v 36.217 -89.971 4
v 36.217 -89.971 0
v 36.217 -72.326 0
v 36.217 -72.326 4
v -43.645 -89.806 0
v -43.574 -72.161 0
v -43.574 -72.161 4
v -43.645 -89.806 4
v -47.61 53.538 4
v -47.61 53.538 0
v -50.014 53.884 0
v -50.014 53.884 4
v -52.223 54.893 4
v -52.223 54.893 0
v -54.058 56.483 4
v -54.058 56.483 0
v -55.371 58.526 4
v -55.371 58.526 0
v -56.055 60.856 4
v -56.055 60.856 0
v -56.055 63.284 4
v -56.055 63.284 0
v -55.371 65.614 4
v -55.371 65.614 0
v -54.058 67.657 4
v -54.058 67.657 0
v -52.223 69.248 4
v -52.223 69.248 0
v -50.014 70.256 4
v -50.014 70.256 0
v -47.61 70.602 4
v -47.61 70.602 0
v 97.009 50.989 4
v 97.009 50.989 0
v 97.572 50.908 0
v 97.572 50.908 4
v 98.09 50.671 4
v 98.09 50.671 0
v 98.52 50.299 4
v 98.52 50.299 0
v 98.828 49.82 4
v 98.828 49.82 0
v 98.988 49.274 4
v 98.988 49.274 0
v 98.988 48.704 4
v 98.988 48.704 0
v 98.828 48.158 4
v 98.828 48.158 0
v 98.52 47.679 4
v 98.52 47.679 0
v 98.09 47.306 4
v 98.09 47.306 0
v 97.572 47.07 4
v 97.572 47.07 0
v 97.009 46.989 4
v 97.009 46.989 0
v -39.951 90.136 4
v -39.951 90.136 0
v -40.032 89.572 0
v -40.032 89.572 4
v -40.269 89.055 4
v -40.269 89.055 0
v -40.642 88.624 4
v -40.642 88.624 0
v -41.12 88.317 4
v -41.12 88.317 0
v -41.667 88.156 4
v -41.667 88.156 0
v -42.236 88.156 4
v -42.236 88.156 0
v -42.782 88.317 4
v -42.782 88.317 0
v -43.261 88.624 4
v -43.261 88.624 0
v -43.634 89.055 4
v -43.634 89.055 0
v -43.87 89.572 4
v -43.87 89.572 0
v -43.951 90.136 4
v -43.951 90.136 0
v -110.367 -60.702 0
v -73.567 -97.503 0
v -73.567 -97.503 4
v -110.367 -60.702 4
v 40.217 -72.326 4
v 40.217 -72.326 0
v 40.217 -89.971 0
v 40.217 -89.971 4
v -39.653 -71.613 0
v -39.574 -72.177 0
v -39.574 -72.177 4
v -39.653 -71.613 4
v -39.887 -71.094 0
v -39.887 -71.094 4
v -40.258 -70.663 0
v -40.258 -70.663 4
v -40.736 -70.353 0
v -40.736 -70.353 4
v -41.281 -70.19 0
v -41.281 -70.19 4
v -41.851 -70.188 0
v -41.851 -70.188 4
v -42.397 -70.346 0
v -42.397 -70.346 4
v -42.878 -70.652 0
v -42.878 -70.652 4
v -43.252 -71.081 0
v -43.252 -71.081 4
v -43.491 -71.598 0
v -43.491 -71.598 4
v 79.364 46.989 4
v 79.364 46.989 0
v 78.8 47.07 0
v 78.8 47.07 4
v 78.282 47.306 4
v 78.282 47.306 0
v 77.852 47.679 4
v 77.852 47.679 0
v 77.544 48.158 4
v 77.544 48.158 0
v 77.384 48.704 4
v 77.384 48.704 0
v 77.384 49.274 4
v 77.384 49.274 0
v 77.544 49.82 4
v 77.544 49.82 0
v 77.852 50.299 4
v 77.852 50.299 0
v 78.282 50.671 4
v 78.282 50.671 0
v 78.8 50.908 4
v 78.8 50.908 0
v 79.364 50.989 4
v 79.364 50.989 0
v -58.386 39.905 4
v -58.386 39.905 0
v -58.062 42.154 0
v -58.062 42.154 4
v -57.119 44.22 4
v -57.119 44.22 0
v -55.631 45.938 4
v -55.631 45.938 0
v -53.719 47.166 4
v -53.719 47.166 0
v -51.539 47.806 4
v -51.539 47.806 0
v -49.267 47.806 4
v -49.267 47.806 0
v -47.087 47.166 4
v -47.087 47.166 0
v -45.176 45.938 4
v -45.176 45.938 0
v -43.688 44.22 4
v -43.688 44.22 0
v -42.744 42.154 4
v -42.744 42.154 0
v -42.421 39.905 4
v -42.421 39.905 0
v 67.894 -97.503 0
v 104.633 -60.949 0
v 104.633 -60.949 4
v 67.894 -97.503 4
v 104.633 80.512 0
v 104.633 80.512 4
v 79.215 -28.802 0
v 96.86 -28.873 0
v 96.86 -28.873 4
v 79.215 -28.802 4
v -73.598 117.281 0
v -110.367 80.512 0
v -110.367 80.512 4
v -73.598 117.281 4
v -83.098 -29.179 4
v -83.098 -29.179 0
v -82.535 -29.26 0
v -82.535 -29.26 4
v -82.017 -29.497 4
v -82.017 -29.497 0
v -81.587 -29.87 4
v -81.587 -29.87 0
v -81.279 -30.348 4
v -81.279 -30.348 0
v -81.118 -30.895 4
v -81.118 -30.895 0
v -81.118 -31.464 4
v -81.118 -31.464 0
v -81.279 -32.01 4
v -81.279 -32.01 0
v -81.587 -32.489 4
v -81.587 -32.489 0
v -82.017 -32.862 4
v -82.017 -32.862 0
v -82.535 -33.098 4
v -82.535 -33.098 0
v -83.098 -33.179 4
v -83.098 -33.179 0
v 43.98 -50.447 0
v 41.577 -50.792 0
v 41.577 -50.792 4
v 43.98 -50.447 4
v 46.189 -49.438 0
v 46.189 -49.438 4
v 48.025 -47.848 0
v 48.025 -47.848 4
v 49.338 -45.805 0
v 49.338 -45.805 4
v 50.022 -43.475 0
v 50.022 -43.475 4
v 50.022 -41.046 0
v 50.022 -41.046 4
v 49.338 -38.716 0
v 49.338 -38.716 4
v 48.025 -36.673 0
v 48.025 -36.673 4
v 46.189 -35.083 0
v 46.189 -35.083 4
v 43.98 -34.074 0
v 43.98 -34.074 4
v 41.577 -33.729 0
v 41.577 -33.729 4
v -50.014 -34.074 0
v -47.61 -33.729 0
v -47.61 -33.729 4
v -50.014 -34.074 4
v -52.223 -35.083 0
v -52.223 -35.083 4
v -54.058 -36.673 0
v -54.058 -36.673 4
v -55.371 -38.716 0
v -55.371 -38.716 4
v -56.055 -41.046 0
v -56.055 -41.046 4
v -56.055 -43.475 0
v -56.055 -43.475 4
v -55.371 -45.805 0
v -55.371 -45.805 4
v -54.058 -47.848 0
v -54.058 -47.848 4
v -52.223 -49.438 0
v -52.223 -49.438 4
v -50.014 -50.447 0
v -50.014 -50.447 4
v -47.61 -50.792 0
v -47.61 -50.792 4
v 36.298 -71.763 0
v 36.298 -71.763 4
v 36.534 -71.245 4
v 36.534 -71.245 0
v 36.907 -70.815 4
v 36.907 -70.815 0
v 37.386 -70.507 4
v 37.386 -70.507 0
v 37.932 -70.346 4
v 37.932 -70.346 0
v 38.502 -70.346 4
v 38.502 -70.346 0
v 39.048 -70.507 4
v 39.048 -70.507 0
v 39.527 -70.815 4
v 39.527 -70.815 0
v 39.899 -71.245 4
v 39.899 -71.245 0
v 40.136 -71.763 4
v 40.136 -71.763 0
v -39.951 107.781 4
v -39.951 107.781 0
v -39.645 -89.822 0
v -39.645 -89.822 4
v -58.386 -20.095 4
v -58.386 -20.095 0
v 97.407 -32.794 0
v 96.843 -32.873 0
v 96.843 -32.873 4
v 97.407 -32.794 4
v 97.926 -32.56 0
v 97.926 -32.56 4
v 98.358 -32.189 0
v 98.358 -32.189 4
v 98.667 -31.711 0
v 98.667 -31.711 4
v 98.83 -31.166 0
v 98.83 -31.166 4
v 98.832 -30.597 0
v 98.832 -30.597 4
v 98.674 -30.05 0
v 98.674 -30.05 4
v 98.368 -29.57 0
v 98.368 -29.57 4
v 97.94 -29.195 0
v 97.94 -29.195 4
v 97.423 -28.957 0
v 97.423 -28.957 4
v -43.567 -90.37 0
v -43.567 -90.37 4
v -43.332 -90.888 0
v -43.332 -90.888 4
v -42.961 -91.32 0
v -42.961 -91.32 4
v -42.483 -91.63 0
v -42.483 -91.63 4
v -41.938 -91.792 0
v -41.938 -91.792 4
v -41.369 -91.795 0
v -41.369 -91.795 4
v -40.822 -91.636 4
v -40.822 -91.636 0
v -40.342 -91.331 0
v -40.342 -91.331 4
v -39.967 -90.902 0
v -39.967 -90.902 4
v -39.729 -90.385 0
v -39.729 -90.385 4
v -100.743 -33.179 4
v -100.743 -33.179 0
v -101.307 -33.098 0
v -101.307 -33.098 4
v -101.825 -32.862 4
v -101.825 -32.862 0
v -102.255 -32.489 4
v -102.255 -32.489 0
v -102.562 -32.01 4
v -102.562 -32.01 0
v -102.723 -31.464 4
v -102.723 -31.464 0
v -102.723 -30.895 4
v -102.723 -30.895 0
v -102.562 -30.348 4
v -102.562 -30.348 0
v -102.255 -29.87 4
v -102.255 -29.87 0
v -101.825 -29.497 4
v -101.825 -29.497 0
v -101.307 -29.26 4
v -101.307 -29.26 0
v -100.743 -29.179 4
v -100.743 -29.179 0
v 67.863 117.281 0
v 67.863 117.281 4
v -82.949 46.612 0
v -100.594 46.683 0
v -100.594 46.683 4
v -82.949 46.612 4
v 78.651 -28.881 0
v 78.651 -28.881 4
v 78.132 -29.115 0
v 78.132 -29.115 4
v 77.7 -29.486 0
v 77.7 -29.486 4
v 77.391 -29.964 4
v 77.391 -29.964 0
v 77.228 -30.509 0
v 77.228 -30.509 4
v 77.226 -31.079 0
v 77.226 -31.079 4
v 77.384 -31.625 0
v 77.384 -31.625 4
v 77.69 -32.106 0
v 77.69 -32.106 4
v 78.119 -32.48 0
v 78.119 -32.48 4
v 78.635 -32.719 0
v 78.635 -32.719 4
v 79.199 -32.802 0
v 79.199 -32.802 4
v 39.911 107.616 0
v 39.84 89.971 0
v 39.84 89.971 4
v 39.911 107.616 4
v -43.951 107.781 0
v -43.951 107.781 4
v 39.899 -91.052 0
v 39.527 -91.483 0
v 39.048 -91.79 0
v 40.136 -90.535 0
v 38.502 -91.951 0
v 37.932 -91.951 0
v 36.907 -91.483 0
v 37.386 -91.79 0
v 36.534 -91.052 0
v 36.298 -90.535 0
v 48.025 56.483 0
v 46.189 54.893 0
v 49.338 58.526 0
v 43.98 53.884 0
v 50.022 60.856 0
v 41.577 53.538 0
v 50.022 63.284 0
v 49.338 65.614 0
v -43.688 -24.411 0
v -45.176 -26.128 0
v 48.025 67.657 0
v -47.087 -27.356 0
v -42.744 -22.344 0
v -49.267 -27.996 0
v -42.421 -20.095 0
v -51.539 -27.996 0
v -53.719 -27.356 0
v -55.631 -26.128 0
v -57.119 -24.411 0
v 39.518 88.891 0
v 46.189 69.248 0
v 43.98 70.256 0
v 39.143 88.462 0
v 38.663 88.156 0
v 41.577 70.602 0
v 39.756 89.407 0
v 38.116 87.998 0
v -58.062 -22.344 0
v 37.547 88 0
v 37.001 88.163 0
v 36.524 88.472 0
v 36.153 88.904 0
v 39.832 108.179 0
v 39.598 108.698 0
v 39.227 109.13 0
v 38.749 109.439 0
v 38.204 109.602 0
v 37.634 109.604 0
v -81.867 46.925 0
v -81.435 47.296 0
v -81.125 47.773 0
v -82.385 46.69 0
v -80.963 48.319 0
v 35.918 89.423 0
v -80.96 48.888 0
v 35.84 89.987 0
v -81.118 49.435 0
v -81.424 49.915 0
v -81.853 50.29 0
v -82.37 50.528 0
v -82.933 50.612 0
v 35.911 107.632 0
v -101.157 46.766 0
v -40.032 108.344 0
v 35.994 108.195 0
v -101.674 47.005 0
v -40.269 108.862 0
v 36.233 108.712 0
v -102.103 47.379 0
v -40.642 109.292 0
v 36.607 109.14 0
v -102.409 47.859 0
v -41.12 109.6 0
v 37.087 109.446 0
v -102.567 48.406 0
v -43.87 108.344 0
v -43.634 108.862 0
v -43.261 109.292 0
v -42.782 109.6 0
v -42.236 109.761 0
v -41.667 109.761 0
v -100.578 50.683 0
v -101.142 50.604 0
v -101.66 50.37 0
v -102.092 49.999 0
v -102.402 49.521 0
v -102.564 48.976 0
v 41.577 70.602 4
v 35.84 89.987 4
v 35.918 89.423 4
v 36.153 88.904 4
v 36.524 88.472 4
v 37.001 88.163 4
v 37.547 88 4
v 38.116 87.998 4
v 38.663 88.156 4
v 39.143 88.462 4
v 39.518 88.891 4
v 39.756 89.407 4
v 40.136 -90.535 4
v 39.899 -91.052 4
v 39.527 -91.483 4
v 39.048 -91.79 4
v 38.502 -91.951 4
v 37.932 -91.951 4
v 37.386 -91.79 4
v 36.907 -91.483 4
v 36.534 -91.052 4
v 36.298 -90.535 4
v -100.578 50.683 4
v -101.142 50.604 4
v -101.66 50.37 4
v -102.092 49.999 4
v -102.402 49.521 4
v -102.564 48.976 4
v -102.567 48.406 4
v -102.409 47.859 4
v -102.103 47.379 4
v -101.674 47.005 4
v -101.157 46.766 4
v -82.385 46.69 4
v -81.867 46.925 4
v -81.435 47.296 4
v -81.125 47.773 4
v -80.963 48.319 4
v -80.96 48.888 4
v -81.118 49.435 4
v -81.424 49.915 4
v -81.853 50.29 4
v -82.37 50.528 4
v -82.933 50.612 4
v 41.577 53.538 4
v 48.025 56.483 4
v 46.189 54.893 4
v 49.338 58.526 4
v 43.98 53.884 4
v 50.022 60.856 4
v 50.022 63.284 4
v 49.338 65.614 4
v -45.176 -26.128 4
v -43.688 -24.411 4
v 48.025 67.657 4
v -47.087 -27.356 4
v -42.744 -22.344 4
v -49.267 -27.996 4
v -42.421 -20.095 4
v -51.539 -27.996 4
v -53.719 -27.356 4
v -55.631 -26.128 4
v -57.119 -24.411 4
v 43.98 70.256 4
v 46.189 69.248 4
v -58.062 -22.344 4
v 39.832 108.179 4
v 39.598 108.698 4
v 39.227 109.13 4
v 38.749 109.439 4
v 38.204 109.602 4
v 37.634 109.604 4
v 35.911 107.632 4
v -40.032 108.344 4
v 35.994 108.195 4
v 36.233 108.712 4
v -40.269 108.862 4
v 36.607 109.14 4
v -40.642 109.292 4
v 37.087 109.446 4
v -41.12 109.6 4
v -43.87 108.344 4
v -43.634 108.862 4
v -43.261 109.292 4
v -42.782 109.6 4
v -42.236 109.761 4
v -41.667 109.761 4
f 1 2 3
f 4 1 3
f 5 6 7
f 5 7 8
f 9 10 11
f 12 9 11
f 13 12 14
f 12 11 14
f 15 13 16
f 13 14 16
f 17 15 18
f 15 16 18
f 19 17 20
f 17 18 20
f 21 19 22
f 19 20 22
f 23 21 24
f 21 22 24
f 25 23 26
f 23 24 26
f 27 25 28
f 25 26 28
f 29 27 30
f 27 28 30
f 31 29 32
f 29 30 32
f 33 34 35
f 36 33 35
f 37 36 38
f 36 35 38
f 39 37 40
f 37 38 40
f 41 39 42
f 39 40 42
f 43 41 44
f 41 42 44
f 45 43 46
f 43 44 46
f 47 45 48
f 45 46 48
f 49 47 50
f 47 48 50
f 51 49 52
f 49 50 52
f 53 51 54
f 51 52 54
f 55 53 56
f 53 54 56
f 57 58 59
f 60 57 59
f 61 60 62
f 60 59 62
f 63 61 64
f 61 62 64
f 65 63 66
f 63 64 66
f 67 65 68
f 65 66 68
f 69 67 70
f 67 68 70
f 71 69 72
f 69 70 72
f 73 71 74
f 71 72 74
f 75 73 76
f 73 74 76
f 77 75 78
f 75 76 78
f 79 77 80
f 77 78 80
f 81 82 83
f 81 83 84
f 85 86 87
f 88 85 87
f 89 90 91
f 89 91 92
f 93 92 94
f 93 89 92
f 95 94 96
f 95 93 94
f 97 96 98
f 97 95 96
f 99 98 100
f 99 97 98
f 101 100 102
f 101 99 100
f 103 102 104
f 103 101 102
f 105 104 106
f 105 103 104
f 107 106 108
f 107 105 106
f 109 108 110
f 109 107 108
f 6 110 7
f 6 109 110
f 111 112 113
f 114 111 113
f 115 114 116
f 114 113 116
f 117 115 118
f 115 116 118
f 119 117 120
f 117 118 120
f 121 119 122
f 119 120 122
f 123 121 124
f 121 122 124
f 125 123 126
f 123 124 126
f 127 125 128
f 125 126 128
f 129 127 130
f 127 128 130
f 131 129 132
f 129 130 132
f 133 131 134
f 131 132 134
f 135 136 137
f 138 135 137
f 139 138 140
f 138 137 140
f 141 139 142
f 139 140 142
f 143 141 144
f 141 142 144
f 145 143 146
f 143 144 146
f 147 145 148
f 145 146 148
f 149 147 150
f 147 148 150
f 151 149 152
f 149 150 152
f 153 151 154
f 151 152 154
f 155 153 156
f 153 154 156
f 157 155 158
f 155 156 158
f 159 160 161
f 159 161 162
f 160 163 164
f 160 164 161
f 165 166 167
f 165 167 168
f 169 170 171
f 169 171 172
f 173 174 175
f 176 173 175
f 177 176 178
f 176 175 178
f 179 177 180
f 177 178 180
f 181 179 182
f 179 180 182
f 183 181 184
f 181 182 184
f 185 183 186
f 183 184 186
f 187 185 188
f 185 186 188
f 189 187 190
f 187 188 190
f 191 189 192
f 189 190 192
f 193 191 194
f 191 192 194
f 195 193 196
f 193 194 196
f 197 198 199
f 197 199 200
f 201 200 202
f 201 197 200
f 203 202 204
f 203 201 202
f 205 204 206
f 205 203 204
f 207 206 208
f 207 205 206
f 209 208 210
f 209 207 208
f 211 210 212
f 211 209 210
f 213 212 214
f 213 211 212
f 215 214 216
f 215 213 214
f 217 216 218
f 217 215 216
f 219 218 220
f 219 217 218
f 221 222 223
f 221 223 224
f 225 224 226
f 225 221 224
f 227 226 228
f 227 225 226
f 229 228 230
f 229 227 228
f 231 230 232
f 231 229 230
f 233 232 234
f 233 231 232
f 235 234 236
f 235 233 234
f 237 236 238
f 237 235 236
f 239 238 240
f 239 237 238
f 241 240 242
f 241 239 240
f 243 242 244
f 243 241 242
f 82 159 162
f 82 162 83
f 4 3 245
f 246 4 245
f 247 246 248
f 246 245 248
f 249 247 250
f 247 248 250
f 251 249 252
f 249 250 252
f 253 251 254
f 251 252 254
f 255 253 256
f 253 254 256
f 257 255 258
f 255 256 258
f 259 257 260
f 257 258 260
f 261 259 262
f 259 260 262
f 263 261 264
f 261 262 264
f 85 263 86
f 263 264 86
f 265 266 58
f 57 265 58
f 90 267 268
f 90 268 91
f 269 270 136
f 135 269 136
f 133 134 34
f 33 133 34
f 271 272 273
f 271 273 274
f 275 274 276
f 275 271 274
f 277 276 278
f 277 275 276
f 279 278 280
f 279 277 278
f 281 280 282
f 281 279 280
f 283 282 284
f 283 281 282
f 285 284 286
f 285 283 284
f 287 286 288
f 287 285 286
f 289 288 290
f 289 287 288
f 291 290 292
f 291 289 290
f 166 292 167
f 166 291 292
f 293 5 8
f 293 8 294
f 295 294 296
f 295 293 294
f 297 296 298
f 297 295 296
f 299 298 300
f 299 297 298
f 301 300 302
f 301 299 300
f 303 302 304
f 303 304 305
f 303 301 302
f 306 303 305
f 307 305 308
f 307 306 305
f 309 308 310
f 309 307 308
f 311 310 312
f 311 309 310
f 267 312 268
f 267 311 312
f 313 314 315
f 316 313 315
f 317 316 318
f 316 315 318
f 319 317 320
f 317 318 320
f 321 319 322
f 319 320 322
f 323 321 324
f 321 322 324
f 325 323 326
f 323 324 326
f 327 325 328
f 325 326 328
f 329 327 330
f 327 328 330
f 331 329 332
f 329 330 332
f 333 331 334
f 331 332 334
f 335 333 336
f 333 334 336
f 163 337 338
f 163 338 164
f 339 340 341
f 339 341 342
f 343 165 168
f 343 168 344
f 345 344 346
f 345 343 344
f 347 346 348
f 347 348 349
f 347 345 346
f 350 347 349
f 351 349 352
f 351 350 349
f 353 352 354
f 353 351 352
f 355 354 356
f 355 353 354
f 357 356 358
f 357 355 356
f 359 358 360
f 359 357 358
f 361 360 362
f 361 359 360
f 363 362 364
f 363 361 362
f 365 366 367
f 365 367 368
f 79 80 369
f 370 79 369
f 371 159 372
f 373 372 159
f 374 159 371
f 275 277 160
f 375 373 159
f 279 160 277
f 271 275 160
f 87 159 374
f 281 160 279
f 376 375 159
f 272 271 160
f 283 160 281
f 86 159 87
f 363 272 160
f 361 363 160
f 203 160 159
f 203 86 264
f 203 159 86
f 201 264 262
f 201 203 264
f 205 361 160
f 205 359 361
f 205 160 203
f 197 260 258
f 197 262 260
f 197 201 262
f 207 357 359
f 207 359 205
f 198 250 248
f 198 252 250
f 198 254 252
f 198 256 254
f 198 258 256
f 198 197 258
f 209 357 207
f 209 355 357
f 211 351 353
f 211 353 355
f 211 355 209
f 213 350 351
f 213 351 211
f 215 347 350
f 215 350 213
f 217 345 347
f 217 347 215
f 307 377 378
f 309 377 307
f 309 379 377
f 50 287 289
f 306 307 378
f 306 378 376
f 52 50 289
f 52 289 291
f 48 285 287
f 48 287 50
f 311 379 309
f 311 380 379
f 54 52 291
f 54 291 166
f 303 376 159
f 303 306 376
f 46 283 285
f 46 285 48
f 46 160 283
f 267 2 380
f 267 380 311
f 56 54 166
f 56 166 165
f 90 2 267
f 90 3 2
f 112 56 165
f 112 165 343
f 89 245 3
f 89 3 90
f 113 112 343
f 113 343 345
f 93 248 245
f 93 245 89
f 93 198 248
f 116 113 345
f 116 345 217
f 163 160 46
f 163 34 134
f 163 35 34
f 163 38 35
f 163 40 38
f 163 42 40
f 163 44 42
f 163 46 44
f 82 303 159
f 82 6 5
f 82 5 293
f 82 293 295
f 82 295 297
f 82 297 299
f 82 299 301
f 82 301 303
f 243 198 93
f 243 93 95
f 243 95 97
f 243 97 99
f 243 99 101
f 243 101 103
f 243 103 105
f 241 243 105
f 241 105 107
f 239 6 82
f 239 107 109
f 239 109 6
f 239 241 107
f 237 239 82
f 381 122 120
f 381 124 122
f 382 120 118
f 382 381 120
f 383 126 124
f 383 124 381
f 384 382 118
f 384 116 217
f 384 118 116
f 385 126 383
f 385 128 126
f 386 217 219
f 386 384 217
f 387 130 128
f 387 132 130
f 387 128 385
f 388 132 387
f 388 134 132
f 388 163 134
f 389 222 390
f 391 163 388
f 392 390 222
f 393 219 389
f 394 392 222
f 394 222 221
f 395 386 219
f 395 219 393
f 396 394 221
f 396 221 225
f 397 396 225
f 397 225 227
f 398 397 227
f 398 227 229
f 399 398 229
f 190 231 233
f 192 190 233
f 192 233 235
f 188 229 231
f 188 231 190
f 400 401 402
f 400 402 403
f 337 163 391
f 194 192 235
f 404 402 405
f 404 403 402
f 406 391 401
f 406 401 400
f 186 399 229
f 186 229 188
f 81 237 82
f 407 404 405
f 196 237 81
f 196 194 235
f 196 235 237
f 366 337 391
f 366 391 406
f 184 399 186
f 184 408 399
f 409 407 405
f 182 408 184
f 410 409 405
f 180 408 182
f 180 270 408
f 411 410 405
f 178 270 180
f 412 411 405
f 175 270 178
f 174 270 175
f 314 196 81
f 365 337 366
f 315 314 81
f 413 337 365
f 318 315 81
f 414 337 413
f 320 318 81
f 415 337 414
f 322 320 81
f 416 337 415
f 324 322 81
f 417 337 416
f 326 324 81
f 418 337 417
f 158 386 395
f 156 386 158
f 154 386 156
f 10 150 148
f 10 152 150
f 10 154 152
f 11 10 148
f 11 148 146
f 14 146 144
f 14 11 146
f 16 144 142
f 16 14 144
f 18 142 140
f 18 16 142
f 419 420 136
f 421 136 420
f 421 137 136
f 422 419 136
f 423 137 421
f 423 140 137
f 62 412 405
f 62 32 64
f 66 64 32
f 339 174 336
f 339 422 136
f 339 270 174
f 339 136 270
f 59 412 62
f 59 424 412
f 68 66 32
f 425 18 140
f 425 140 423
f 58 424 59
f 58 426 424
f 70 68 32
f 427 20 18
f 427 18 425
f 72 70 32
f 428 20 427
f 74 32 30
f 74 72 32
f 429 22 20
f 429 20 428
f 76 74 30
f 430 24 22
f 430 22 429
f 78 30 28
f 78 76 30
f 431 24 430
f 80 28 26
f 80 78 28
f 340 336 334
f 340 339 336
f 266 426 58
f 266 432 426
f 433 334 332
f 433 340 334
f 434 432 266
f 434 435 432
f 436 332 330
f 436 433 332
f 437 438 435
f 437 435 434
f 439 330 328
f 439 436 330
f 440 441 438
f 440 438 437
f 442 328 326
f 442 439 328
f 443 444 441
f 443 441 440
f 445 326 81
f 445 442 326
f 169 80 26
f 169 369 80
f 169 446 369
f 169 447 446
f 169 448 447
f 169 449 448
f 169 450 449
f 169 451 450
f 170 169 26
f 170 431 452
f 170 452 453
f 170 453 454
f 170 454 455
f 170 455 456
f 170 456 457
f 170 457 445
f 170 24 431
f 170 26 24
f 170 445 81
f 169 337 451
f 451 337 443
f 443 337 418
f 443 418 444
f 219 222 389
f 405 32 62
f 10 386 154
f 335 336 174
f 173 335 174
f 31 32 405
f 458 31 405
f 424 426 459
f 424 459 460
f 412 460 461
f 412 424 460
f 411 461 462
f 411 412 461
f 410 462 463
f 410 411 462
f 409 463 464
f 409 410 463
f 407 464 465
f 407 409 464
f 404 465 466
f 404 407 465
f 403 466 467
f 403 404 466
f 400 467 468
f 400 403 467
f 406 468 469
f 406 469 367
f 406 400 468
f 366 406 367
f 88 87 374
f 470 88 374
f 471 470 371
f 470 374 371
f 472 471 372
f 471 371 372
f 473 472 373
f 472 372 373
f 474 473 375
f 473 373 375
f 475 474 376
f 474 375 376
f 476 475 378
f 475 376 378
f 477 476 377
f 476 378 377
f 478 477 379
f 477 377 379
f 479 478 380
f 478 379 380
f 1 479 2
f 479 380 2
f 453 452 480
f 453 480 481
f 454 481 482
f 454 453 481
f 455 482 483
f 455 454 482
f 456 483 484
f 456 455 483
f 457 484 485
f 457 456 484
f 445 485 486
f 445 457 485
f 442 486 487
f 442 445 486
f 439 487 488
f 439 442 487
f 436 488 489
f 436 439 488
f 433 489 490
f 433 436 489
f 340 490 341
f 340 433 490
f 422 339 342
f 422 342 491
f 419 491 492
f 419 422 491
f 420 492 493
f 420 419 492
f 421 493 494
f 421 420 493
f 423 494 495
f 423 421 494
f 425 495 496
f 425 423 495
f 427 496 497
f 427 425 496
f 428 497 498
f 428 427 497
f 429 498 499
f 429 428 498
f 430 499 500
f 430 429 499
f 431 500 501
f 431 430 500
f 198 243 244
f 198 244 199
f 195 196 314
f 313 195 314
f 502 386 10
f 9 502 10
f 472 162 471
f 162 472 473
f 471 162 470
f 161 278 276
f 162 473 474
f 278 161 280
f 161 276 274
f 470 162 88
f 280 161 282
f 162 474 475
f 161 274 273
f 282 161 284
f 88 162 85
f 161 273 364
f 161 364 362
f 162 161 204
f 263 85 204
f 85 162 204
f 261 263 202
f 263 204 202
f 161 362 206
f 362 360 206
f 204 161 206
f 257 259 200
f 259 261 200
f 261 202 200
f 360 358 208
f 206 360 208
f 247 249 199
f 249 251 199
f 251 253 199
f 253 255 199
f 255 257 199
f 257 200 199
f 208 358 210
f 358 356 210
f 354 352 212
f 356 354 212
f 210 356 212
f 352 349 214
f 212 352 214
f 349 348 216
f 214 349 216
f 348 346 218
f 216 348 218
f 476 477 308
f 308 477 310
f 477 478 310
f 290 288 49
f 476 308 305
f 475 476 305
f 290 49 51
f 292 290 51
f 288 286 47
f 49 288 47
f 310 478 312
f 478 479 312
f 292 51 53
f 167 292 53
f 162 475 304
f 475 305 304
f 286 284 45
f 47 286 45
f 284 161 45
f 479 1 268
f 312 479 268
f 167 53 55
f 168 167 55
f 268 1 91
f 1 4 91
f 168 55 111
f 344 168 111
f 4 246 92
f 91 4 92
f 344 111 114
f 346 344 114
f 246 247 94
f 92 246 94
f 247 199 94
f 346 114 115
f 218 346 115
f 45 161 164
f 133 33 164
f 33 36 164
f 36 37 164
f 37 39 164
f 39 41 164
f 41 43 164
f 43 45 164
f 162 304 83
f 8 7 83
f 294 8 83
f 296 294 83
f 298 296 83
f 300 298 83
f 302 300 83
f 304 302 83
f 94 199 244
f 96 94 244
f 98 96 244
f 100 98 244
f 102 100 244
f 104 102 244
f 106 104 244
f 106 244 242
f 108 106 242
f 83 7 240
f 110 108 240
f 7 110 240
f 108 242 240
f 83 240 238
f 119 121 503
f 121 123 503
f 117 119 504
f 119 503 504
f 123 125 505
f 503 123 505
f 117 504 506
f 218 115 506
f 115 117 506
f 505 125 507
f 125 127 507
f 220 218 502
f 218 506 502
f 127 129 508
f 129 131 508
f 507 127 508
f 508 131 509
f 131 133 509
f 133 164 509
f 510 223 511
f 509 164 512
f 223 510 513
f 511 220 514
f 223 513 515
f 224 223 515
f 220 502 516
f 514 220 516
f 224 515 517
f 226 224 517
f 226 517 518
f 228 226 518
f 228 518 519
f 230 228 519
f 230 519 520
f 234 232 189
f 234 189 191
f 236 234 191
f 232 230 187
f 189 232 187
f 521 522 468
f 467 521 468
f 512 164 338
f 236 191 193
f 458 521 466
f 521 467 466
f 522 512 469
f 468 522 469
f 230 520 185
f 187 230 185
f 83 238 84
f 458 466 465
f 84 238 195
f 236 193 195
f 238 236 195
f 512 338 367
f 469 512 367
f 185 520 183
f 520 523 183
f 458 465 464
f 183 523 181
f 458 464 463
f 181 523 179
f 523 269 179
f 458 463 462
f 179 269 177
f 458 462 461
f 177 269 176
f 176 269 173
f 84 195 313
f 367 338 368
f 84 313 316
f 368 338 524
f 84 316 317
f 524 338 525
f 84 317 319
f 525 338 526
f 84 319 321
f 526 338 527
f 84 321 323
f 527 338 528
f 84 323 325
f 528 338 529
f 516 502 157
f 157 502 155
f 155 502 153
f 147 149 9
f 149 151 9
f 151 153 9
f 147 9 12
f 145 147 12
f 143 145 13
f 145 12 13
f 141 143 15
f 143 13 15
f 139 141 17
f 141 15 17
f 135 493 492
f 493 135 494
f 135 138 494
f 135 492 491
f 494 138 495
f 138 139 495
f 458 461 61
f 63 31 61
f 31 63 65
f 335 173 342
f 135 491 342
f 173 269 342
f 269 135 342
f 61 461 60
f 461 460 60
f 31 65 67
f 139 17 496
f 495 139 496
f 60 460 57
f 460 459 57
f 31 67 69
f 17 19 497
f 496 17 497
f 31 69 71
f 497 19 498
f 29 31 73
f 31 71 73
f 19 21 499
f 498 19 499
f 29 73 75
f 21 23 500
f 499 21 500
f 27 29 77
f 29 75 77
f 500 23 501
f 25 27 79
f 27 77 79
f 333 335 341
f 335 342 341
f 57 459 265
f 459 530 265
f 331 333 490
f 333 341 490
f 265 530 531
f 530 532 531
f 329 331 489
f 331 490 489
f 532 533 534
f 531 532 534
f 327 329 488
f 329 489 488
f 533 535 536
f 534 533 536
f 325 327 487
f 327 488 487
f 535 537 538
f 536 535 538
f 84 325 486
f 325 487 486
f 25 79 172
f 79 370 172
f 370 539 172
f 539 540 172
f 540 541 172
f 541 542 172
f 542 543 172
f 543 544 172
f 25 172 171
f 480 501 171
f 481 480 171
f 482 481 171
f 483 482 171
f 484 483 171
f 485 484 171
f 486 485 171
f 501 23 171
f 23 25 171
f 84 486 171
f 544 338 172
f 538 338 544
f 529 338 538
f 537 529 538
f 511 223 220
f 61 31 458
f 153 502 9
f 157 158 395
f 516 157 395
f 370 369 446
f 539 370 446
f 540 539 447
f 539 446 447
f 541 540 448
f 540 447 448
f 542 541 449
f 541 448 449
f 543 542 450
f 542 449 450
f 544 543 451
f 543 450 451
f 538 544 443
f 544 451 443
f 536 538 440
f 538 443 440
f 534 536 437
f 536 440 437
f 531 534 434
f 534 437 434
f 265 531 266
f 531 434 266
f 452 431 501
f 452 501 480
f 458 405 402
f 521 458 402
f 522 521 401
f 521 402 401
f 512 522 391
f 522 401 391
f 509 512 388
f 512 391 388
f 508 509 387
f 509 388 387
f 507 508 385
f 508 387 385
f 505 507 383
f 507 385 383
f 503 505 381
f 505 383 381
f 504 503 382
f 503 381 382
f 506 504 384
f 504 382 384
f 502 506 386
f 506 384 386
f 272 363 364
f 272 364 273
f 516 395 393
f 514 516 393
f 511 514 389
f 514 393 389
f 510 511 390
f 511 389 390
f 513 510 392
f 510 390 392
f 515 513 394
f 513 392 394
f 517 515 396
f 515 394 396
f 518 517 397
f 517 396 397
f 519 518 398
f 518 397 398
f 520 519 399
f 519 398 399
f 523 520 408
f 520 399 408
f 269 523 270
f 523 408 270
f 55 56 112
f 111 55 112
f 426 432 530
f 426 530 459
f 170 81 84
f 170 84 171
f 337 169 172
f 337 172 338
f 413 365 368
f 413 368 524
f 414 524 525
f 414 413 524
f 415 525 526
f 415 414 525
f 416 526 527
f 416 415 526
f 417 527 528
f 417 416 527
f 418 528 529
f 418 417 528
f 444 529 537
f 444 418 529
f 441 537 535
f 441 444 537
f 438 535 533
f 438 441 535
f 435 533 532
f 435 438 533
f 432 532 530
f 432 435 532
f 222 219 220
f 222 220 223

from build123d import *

# Parameters (mm, degrees)
BOSS_EXTRUDE2_DEPTH = 4


with BuildPart() as part:
    # Sketch1 → Boss-Extrude2 (new body)
    with BuildSketch(Plane.XY):
        Polygon((-73.597643579, 117.281365478), (67.863251178, 117.281365478), (104.632803799, 80.511812856), (104.632803799, -60.949081901), (67.894125273, -97.50252168), (-73.566769484, -97.50252168), (-110.367196201, -60.702096755), (-110.367196201, 80.511812856), align=None)
        with BuildLine():
            Line((-47.610288665, 70.602021163), (41.576775637, 70.602021163))
            ThreePointArc((41.576775637, 70.602021163), (50.108558427, 62.070238373), (41.576775637, 53.538455583))
            Line((41.576775637, 53.538455583), (-47.610288665, 53.538455583))
            ThreePointArc((-47.610288665, 53.538455583), (-56.142071455, 62.070238373), (-47.610288665, 70.602021163))
        make_face(mode=Mode.SUBTRACT)
        with BuildLine():
            Line((-47.610288665, -50.792305062), (41.576775637, -50.792305062))
            ThreePointArc((41.576775637, -50.792305062), (50.108558427, -42.260522272), (41.576775637, -33.728739482))
            Line((41.576775637, -33.728739482), (-47.610288665, -33.728739482))
            ThreePointArc((-47.610288665, -33.728739482), (-56.142071455, -42.260522272), (-47.610288665, -50.792305062))
        make_face(mode=Mode.SUBTRACT)
        with BuildLine():
            Line((-58.385806079, -20.095141949), (-58.385806079, 39.904858051))
            ThreePointArc((-58.385806079, 39.904858051), (-50.403357017, 47.887307113), (-42.420907955, 39.904858051))
            Line((-42.420907955, 39.904858051), (-42.420907955, -20.095141949))
            ThreePointArc((-42.420907955, -20.095141949), (-50.403357017, -28.077591011), (-58.385806079, -20.095141949))
        make_face(mode=Mode.SUBTRACT)
        with BuildLine():
            Line((-43.951300834, 90.135788358), (-43.951300834, 107.780882998))
            ThreePointArc((-43.951300834, 107.780882998), (-41.951300834, 109.780882998), (-39.951300834, 107.780882998))
            Line((-39.951300834, 107.780882998), (-39.951300834, 90.135788358))
            ThreePointArc((-39.951300834, 90.135788358), (-41.951300834, 88.135788358), (-43.951300834, 90.135788358))
        make_face(mode=Mode.SUBTRACT)
        with BuildLine():
            Line((39.83957888, 89.970561723), (39.910868679, 107.61551235))
            ThreePointArc((39.910868679, 107.61551235), (37.918965413, 109.623576437), (35.910901326, 107.63167317))
            Line((35.910901326, 107.63167317), (35.839611526, 89.986722543))
            ThreePointArc((35.839611526, 89.986722543), (37.831514793, 87.978658457), (39.83957888, 89.970561723))
        make_face(mode=Mode.SUBTRACT)
        with BuildLine():
            Line((-83.098126059, -33.179247031), (-100.743220699, -33.179247031))
            ThreePointArc((-100.743220699, -33.179247031), (-102.743220699, -31.179247031), (-100.743220699, -29.179247031))
            Line((-100.743220699, -29.179247031), (-83.098126059, -29.179247031))
            ThreePointArc((-83.098126059, -29.179247031), (-81.098126059, -31.179247031), (-83.098126059, -33.179247031))
        make_face(mode=Mode.SUBTRACT)
        with BuildLine():
            Line((-82.932899424, 50.611632682), (-100.577850051, 50.682922481))
            ThreePointArc((-100.577850051, 50.682922481), (-102.585914138, 48.691019215), (-100.594010871, 46.682955128))
            Line((-100.594010871, 46.682955128), (-82.949060244, 46.611665329))
            ThreePointArc((-82.949060244, 46.611665329), (-80.940996157, 48.603568595), (-82.932899424, 50.611632682))
        make_face(mode=Mode.SUBTRACT)
        with BuildLine():
            Line((40.21690933, -72.326072256), (40.21690933, -89.971166897))
            ThreePointArc((40.21690933, -89.971166897), (38.21690933, -91.971166897), (36.21690933, -89.971166897))
            Line((36.21690933, -89.971166897), (36.21690933, -72.326072256))
            ThreePointArc((36.21690933, -72.326072256), (38.21690933, -70.326072256), (40.21690933, -72.326072256))
        make_face(mode=Mode.SUBTRACT)
        with BuildLine():
            Line((-43.573970383, -72.160845622), (-43.645260182, -89.805796249))
            ThreePointArc((-43.645260182, -89.805796249), (-41.653356916, -91.813860335), (-39.645292829, -89.821957069))
            Line((-39.645292829, -89.821957069), (-39.574003029, -72.177006442))
            ThreePointArc((-39.574003029, -72.177006442), (-41.565906296, -70.168942355), (-43.573970383, -72.160845622))
        make_face(mode=Mode.SUBTRACT)
        with BuildLine():
            Line((79.363734556, 50.988963133), (97.008829196, 50.988963133))
            ThreePointArc((97.008829196, 50.988963133), (99.008829196, 48.988963133), (97.008829196, 46.988963133))
            Line((97.008829196, 46.988963133), (79.363734556, 46.988963133))
            ThreePointArc((79.363734556, 46.988963133), (77.363734556, 48.988963133), (79.363734556, 50.988963133))
        make_face(mode=Mode.SUBTRACT)
        with BuildLine():
            Line((79.198507921, -32.801916581), (96.843458548, -32.87320638))
            ThreePointArc((96.843458548, -32.87320638), (98.851522635, -30.881303113), (96.859619368, -28.873239027))
            Line((96.859619368, -28.873239027), (79.214668741, -28.801949227))
            ThreePointArc((79.214668741, -28.801949227), (77.206604654, -30.793852494), (79.198507921, -32.801916581))
        make_face(mode=Mode.SUBTRACT)
    extrude(amount=BOSS_EXTRUDE2_DEPTH)


solid = part.part
